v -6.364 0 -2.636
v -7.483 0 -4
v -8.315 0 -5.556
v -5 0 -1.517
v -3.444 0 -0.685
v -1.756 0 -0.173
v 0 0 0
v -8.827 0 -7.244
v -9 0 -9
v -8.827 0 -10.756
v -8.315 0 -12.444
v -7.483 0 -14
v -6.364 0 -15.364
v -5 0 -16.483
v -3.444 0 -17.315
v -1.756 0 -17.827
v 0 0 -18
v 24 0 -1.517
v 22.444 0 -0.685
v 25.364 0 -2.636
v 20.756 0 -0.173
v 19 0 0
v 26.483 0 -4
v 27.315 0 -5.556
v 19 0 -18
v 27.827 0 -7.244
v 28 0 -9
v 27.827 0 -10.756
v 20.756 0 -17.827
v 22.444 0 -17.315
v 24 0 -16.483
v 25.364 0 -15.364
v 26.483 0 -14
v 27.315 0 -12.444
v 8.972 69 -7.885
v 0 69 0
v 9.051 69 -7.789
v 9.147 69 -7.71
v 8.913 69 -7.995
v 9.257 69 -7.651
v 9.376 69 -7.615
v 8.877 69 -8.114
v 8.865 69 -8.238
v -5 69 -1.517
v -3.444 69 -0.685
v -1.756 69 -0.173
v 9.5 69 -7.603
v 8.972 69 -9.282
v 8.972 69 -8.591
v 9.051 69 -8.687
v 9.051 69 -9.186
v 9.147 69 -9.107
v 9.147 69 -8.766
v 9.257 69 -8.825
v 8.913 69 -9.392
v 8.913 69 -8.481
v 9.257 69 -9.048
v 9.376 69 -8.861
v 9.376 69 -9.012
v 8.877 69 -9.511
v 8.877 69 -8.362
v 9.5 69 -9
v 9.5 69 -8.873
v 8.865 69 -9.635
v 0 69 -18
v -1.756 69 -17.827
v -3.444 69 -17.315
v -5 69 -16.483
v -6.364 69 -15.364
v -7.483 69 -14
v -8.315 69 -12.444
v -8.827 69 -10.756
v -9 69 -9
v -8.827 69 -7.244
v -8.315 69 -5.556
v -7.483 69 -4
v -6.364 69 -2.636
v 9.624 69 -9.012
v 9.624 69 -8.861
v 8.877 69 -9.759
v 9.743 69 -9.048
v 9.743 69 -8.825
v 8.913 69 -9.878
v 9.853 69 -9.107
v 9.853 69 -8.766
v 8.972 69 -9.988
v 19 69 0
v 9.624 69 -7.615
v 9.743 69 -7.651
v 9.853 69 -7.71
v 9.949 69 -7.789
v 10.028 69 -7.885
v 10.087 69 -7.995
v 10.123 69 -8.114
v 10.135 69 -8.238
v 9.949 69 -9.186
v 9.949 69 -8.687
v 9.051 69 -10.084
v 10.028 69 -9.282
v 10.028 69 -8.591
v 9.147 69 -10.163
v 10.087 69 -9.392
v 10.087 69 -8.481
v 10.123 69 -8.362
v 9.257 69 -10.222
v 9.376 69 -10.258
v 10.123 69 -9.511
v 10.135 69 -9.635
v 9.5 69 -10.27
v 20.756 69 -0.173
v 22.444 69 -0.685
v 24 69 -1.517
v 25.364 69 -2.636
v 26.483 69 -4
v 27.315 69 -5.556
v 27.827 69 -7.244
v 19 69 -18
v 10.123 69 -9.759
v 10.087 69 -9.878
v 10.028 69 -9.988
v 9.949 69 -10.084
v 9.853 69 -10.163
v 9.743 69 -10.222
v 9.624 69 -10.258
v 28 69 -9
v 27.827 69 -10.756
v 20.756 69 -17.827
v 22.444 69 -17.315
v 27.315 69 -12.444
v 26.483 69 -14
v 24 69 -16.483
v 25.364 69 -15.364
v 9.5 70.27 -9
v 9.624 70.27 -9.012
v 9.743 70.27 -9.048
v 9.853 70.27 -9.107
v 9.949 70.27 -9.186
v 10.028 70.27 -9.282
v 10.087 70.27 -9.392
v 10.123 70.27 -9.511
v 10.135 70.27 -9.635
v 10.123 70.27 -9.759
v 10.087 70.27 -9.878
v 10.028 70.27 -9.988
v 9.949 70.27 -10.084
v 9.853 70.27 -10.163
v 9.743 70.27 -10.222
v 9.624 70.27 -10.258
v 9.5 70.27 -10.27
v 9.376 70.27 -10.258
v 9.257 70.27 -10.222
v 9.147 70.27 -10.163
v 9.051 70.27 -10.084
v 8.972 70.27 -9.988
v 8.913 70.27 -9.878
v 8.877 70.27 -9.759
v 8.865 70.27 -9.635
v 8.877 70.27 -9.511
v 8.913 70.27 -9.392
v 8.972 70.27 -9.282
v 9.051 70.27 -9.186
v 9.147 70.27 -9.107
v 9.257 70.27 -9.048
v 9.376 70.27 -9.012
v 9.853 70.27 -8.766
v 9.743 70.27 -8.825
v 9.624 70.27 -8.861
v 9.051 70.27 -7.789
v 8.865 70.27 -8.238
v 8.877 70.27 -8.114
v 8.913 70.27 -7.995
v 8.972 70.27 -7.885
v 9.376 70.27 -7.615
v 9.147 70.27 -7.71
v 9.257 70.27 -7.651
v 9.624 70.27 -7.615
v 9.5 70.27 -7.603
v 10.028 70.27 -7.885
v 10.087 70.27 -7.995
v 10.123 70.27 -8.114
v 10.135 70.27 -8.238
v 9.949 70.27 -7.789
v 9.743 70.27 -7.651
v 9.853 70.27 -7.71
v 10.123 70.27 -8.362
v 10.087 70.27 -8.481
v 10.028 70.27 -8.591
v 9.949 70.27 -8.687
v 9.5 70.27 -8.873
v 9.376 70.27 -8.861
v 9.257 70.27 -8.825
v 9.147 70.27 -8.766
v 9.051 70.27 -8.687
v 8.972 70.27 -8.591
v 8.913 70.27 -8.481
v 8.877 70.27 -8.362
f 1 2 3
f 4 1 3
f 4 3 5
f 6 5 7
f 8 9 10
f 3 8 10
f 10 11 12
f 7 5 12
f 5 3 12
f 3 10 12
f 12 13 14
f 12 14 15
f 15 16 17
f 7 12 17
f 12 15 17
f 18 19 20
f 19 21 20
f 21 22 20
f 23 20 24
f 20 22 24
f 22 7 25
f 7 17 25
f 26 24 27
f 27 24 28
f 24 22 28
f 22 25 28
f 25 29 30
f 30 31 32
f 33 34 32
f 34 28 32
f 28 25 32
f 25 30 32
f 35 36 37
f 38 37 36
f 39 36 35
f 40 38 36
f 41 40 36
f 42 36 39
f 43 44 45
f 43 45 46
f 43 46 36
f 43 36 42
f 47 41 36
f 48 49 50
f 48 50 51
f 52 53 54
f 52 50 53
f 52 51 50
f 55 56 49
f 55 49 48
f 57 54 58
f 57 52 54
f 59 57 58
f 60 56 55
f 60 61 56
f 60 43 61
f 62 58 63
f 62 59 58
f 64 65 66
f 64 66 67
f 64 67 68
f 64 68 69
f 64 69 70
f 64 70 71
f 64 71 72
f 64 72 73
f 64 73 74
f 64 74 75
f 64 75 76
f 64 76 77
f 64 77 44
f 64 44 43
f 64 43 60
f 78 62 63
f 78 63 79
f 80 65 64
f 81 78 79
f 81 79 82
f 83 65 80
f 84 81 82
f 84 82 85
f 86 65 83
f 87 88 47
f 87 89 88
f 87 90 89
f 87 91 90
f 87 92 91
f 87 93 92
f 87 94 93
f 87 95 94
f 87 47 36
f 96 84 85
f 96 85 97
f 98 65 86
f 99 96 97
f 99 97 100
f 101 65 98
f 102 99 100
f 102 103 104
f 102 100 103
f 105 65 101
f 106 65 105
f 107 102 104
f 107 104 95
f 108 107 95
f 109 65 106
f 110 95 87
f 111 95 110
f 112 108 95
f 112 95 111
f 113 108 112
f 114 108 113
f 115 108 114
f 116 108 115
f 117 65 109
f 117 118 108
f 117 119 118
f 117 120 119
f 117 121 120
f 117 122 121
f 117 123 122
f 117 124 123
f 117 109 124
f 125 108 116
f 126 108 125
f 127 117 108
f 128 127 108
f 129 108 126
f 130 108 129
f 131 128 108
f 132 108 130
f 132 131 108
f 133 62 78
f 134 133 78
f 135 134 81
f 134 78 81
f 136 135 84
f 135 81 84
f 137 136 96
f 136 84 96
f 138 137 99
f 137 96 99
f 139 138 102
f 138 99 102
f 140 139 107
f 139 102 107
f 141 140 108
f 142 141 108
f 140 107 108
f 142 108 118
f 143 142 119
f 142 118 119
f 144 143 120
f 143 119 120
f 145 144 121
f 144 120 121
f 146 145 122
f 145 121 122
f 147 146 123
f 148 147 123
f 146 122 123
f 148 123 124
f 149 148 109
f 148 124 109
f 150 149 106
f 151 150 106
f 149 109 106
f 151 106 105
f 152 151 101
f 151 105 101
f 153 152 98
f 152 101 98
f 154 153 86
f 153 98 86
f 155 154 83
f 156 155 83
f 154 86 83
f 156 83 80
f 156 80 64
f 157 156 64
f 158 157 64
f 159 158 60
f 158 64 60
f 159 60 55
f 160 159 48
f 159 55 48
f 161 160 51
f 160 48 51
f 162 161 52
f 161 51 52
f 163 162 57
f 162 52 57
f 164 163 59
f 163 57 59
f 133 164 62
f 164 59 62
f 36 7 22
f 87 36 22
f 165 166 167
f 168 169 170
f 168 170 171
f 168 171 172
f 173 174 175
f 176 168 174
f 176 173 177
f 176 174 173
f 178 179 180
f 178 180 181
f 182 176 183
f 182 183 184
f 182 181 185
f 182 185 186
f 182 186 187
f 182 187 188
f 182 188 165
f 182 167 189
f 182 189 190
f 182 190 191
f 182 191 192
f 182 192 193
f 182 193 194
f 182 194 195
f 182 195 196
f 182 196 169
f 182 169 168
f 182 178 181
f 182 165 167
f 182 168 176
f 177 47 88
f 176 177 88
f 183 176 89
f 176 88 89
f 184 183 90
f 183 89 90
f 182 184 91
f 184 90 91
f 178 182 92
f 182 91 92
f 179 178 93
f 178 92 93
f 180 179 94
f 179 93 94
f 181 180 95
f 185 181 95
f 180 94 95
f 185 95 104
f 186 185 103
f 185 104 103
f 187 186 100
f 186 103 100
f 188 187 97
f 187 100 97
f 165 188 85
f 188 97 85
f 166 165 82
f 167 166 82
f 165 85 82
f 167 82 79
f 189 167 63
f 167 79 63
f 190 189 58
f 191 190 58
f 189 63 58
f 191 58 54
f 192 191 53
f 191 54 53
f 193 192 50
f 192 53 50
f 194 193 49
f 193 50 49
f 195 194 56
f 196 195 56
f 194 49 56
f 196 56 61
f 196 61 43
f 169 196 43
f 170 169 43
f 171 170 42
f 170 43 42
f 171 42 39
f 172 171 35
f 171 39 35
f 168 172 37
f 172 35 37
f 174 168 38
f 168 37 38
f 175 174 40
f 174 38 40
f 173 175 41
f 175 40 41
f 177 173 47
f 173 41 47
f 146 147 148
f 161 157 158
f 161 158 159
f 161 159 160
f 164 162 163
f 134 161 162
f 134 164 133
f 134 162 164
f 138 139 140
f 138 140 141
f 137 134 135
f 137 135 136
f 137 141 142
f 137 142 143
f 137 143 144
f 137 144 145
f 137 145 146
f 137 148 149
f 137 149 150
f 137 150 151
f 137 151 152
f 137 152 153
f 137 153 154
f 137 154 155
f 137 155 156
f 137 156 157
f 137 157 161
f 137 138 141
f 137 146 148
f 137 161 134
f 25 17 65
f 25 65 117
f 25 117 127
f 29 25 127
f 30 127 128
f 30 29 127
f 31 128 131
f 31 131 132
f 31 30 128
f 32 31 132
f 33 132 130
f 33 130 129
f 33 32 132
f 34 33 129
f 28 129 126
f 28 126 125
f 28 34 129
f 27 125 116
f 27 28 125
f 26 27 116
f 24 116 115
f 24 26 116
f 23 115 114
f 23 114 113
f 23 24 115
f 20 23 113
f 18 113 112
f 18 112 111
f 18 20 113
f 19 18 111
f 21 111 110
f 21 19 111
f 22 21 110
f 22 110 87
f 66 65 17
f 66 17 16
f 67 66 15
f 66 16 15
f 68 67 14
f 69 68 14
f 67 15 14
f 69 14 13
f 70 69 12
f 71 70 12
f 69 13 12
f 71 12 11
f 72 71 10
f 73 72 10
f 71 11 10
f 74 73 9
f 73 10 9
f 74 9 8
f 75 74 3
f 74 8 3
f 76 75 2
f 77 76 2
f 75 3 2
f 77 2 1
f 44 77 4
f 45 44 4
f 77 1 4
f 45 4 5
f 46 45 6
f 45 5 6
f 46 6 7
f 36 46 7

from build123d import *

# Parameters (mm, degrees)
SKETCH1_W           = 19
SKETCH1_H           = 18
BOSS_EXTRUDE1_DEPTH = 69
SKETCH2_R           = 0.635
BOSS_EXTRUDE2_DEPTH = 1.27
SKETCH3_R           = 0.635
BOSS_EXTRUDE4_DEPTH = 1.27


with BuildPart() as part:
    # Sketch1 → Boss-Extrude1 (new body)
    with BuildSketch(Plane(origin=(0, 0, 0), x_dir=(1, 0, 0), z_dir=(0, 1, 0))):
        with BuildLine():
            Line((0, 0), (0, 18))
            ThreePointArc((0, 18), (-9, 9), (0, 0))
        make_face()
        with Locations((9.5, 9)):
            Rectangle(SKETCH1_W, SKETCH1_H)
        with BuildLine():
            Line((19, 0), (19, 18))
            ThreePointArc((19, 18), (28, 9), (19, 0))
        make_face()
    extrude(amount=BOSS_EXTRUDE1_DEPTH)

    # Sketch2 → Boss-Extrude2 (add)
    with BuildSketch(Plane(origin=(0, 69, 0), x_dir=(1, 0, 0), z_dir=(0, 1, 0))):
        with Locations(Location((9.5, 9.635, 0), (0, 0, 270))):
            Circle(SKETCH2_R)
    extrude(amount=BOSS_EXTRUDE2_DEPTH)

    # Sketch3 → Boss-Extrude4 (add)
    with BuildSketch(Plane(origin=(0, 69, 0), x_dir=(1, 0, 0), z_dir=(0, 1, 0))):
        with Locations(Location((9.5, 8.238, 0), (0, 0, 270))):
            Circle(SKETCH3_R)
    extrude(amount=BOSS_EXTRUDE4_DEPTH)


solid = part.part
